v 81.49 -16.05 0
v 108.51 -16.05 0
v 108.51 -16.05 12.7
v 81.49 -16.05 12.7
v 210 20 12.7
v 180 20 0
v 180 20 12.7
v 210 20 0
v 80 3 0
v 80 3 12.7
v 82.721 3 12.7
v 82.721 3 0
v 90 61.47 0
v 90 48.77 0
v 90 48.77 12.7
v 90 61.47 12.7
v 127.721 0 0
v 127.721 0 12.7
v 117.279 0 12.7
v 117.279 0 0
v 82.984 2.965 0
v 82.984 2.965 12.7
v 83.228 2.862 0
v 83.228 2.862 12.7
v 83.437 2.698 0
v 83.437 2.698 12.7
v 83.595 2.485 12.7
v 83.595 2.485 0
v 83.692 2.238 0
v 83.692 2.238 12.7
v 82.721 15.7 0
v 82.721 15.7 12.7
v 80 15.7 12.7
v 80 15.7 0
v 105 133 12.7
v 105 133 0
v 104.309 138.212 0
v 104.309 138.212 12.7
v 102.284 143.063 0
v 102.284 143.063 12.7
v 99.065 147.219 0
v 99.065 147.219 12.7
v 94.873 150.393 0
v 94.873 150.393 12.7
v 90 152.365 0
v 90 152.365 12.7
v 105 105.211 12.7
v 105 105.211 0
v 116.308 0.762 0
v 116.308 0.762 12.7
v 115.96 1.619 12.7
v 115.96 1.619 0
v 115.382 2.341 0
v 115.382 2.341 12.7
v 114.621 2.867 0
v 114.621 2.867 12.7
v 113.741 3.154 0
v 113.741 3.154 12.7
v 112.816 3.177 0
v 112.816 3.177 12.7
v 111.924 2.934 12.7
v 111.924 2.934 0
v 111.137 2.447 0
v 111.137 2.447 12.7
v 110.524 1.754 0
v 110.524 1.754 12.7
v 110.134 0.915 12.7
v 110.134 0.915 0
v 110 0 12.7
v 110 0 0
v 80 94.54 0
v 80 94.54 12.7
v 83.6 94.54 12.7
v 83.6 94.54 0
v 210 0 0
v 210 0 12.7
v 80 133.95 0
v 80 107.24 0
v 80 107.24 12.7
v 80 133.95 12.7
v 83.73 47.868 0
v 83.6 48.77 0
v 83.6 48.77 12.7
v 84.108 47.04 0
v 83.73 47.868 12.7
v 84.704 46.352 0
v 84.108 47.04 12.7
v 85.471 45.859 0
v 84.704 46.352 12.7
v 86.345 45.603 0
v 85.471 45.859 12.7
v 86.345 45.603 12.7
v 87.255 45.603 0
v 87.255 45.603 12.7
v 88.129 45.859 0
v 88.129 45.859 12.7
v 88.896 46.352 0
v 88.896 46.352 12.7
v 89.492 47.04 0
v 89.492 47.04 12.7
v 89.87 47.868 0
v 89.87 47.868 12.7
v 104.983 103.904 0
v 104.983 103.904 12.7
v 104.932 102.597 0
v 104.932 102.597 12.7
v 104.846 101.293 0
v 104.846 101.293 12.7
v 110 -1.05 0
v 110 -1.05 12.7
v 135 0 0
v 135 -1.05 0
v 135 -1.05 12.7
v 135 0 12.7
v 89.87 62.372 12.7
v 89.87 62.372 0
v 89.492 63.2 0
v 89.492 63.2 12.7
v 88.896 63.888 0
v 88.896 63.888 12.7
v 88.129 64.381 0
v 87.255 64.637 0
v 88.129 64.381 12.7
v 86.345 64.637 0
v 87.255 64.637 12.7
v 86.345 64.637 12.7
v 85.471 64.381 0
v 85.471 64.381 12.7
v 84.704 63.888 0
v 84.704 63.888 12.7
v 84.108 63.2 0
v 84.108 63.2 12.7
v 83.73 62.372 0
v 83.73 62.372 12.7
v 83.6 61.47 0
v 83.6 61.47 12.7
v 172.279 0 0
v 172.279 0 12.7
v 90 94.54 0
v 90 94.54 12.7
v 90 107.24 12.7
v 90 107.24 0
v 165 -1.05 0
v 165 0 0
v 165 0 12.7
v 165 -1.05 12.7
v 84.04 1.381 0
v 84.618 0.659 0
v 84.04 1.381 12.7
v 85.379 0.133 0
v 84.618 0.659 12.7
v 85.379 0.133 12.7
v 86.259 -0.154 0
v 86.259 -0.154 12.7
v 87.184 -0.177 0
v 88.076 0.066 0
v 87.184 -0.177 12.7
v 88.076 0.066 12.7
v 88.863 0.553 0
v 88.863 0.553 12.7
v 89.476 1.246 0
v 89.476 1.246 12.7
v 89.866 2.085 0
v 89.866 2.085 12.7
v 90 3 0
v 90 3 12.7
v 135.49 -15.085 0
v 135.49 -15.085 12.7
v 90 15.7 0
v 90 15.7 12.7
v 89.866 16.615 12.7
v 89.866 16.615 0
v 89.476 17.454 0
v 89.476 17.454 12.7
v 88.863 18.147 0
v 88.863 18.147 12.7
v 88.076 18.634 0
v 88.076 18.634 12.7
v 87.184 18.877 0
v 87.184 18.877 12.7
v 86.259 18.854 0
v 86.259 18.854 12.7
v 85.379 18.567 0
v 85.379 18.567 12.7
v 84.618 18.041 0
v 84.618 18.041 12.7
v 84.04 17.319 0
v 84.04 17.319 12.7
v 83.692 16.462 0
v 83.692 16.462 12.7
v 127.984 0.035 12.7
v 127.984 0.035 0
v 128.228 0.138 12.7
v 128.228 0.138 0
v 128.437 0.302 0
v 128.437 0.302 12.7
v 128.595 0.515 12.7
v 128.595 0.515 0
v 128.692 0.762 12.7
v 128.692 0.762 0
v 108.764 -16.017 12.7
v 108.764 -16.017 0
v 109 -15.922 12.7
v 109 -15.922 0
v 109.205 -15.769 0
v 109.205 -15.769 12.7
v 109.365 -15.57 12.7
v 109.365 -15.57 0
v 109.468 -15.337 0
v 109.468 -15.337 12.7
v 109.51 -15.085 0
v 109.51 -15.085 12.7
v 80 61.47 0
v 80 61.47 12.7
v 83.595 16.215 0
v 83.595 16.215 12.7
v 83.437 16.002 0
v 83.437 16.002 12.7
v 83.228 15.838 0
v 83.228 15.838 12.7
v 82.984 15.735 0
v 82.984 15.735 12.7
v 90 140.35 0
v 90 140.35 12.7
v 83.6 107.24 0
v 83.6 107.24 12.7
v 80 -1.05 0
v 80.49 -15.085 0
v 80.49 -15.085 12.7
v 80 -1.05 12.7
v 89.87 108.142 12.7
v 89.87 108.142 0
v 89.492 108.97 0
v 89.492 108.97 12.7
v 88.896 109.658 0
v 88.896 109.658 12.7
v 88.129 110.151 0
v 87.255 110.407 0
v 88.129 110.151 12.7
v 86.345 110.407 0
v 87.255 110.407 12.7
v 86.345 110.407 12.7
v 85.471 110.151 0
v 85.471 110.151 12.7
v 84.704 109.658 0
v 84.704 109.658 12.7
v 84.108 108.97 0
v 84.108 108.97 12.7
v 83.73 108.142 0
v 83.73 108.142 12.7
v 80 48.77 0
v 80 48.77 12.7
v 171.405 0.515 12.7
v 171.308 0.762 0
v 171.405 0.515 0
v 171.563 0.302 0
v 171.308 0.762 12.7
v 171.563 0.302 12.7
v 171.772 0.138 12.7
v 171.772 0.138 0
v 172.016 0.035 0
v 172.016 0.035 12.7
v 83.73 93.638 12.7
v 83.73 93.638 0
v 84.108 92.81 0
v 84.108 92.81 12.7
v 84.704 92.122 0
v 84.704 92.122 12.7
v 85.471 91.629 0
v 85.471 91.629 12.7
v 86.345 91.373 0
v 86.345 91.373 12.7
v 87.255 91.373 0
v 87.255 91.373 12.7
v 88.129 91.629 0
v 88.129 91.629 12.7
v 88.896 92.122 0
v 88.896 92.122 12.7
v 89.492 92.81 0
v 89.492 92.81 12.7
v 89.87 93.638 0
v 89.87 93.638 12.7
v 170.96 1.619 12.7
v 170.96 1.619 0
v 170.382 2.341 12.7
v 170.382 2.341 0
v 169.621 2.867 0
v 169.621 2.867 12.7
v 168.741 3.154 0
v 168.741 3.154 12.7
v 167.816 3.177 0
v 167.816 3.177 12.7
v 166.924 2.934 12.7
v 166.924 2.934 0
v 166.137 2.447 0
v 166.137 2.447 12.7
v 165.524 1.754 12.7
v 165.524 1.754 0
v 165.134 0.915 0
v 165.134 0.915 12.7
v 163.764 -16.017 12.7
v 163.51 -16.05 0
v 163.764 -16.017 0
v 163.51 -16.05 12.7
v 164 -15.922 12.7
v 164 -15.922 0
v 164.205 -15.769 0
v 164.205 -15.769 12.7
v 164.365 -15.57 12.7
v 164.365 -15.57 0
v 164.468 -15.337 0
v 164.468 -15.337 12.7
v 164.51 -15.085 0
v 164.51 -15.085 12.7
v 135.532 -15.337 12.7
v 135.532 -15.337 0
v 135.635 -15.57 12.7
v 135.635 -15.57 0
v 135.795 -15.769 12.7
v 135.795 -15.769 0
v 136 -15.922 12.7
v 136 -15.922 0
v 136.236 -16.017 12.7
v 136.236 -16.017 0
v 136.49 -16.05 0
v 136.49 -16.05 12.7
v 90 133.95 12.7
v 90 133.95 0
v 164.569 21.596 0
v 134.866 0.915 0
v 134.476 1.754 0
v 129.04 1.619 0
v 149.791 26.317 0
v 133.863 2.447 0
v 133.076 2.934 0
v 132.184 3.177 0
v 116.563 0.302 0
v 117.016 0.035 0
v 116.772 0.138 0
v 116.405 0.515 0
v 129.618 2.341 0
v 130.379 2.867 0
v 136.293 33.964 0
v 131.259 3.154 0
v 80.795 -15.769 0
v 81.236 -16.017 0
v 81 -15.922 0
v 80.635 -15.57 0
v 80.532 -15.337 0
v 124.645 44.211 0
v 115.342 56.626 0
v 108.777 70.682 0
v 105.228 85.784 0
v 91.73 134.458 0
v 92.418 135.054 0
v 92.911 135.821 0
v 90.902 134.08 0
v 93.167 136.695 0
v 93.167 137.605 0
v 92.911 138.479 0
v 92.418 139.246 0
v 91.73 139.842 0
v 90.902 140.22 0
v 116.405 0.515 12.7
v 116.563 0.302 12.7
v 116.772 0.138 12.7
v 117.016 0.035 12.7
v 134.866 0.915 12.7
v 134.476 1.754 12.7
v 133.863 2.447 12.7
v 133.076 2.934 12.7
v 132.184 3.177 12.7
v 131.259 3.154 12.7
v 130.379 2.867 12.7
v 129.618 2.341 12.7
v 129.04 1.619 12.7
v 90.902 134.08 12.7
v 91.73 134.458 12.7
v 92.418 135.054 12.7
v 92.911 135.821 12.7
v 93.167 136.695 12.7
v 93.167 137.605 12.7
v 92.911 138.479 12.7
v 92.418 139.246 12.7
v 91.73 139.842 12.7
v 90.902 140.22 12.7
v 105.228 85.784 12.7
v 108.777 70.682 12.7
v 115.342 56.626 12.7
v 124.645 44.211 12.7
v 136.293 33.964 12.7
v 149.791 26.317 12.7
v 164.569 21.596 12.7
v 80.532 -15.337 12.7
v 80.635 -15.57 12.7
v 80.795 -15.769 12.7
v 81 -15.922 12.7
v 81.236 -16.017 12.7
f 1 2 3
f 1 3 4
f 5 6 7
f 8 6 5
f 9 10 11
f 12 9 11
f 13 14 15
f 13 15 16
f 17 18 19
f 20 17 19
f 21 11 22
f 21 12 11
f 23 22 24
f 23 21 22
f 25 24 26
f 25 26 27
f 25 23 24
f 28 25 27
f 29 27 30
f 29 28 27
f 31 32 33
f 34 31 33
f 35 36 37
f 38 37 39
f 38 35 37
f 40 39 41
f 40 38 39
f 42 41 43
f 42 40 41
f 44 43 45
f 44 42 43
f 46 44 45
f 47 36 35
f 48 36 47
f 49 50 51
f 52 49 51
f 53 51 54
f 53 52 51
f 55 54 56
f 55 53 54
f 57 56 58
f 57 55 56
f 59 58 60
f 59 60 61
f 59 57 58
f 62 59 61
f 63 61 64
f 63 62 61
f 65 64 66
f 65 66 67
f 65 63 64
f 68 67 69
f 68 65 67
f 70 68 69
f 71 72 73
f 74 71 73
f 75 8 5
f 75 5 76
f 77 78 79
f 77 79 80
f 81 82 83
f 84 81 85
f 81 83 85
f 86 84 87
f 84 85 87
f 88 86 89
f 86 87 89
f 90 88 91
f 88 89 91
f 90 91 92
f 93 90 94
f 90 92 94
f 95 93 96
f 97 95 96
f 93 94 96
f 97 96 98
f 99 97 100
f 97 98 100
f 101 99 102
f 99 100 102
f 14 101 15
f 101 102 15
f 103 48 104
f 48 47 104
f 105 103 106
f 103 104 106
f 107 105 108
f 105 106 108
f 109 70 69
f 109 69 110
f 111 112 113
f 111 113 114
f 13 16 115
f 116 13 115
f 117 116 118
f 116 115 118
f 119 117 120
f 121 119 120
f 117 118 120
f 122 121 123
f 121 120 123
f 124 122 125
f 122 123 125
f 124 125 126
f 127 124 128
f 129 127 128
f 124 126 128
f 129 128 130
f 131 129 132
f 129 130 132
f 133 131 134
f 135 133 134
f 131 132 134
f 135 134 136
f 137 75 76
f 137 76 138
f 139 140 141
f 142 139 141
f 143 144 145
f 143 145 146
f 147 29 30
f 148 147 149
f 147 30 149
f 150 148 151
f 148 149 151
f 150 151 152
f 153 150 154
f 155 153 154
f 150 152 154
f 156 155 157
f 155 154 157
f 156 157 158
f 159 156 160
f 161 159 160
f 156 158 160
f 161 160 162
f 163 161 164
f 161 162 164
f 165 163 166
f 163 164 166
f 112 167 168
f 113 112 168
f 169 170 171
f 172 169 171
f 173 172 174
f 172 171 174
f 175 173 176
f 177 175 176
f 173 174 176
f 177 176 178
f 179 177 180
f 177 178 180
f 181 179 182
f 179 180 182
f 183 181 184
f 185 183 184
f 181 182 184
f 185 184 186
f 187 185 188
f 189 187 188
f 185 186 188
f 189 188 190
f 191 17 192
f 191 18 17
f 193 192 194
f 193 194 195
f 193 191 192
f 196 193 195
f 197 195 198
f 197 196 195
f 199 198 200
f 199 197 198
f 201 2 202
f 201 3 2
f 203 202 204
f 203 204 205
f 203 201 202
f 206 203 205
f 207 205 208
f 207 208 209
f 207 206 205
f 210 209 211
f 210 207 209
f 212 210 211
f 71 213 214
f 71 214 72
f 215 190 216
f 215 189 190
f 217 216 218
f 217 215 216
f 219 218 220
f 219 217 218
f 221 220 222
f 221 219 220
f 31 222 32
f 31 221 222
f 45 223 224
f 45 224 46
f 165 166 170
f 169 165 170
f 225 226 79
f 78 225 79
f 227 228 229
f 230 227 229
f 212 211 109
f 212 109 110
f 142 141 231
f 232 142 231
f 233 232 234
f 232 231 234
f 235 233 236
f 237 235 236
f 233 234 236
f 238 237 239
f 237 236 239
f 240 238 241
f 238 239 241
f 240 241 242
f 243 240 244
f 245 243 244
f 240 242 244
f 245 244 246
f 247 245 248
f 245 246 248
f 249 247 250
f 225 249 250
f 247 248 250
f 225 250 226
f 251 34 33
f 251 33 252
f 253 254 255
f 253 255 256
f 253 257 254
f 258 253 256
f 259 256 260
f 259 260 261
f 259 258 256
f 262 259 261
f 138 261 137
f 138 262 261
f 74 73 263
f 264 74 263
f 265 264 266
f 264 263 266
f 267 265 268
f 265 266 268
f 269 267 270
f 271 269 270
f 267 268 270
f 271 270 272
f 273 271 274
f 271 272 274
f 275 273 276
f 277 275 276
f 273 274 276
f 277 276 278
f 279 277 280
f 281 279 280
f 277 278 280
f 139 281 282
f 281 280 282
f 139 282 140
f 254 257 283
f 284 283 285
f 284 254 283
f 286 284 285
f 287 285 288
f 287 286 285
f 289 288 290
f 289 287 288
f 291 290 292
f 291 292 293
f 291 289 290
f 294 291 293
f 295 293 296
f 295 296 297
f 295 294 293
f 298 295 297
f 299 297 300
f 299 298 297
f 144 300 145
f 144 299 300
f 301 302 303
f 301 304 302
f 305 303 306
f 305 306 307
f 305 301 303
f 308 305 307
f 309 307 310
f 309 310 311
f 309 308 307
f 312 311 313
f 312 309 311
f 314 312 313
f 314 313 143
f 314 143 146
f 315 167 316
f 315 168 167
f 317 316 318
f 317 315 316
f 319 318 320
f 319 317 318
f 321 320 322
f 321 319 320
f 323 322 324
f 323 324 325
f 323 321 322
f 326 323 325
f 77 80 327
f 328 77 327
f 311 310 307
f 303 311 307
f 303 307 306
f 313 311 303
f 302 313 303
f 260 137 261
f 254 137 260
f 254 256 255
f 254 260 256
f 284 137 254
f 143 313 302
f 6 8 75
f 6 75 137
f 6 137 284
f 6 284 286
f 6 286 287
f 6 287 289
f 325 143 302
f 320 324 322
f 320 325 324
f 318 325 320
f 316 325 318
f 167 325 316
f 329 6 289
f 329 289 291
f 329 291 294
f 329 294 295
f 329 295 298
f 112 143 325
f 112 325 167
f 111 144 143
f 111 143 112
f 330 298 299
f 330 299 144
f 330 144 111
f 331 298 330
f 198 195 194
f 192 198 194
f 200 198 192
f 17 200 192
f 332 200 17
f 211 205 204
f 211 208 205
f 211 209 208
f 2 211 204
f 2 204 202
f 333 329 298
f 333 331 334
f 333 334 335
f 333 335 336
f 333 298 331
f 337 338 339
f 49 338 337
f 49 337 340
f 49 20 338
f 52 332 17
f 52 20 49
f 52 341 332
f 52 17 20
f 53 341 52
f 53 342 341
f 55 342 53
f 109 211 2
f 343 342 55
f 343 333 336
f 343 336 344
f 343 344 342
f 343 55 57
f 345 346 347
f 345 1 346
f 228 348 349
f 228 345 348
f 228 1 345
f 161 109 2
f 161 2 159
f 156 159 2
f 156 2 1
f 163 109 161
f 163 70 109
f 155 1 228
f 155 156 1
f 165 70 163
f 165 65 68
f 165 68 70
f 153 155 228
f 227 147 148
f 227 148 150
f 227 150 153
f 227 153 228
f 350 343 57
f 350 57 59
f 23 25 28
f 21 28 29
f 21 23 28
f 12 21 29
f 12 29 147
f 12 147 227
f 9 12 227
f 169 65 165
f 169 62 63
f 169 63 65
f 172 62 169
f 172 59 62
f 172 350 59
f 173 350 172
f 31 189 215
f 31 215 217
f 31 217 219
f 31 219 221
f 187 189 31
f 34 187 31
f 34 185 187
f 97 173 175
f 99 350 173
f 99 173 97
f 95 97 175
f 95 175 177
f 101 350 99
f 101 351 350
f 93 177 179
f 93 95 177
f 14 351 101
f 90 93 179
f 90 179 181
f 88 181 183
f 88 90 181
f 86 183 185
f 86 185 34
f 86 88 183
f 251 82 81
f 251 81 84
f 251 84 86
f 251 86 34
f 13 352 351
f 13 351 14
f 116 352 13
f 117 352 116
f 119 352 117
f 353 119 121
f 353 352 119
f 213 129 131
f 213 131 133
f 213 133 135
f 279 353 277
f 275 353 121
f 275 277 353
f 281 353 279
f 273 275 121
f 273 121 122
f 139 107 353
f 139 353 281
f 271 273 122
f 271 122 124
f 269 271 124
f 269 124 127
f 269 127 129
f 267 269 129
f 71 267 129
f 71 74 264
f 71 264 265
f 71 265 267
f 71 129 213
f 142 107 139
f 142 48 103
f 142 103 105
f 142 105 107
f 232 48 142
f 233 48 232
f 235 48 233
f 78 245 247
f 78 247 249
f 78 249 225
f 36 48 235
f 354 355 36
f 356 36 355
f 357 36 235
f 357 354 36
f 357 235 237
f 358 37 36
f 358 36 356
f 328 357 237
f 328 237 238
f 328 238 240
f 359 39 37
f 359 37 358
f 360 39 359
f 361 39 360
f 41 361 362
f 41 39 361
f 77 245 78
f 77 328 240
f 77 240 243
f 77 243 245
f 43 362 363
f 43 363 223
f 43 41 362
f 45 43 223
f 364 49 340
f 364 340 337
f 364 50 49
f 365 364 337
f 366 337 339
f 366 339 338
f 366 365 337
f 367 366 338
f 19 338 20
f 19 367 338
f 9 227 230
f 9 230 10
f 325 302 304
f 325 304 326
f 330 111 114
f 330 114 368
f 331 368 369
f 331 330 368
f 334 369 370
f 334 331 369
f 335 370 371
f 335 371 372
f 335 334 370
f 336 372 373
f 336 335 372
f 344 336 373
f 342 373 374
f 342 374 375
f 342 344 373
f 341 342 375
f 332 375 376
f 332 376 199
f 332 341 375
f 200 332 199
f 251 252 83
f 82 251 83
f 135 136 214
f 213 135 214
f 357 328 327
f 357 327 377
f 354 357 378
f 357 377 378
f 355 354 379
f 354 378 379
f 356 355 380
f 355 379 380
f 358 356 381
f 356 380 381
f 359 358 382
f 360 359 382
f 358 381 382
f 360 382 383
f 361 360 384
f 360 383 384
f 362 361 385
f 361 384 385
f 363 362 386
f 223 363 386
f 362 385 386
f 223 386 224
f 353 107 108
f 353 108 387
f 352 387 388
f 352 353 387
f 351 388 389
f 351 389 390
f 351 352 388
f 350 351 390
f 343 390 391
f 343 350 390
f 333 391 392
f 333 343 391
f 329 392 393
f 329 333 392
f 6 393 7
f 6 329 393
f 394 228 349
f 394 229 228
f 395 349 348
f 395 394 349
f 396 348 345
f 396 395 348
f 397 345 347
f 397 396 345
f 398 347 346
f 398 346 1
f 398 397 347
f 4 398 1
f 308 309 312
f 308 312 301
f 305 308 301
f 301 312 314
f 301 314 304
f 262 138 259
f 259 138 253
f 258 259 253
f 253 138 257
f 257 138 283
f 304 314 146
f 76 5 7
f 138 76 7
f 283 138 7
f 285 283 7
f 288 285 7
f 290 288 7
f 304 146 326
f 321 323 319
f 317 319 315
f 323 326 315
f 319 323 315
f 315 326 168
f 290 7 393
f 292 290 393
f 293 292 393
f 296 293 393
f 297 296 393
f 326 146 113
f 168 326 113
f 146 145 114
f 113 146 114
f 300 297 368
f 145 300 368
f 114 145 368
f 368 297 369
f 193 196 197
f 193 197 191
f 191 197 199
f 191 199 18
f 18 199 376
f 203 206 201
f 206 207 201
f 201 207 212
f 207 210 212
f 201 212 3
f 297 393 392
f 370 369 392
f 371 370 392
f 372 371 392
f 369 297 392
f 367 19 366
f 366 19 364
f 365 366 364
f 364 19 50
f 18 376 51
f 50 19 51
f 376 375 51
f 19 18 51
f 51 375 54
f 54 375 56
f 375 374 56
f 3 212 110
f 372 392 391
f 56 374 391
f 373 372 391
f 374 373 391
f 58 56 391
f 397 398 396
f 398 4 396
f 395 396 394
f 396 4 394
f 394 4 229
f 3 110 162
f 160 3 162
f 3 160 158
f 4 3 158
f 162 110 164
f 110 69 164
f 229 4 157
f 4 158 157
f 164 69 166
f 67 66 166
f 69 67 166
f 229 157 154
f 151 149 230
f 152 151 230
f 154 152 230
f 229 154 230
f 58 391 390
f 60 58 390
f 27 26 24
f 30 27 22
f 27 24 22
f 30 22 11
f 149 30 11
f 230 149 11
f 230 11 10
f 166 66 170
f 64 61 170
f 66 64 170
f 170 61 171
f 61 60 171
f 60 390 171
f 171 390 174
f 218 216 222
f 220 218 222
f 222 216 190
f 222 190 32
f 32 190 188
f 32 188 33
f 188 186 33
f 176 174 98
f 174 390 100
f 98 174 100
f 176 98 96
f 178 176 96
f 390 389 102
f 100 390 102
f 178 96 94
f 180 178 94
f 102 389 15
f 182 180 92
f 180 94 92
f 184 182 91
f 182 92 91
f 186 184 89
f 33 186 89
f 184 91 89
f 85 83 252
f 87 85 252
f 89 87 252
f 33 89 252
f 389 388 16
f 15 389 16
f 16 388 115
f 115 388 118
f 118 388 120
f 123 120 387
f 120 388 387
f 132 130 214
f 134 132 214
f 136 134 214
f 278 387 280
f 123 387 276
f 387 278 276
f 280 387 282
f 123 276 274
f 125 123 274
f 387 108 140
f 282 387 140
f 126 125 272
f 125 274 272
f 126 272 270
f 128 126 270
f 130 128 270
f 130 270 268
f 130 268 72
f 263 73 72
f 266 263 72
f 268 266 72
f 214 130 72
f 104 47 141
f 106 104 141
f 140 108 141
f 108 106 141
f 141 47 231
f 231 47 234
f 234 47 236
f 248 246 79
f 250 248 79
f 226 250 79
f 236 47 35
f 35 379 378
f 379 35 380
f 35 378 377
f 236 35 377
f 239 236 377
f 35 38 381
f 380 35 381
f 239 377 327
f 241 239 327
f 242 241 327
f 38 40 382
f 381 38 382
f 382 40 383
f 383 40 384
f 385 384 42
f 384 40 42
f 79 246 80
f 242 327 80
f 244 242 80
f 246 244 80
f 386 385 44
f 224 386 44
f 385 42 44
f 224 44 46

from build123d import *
from OCP.BRepFilletAPI import BRepFilletAPI_MakeChamfer

# Parameters (mm, degrees)
BOSS_EXTRUDE1_DEPTH = 12.7
FILLET1_R           = 50
FILLET2_R           = 20
CUT_EXTRUDE1_DEPTH  = 261.135137957
CHAMFER1_SIZE       = 15
CHAMFER1_SIZE2      = 0.523811542
FILLET3_R           = 1
LPATTERN1_COUNT     = 3
LPATTERN1_PITCH     = 45.77
CUT_EXTRUDE2_DEPTH  = 261.135137957


with BuildPart() as part:
    # Sketch1 → Boss-Extrude1 (new body)
    with BuildSketch(Plane.XY):
        with BuildLine():
            Line((105, 153), (105, 103))
            ThreePointArc((105, 103), (124.067004371, 44.843678649), (180, 20))
            Line((180, 20), (210, 20))
            Line((210, 20), (210, 0))
            Line((210, 0), (171.4, 0))
            ThreePointArc((171.4, 0), (168.2, 3.2), (165, 0))
            Line((165, 0), (165, -16.05))
            Line((165, -16.05), (135, -16.05))
            Line((135, -16.05), (135, 0))
            ThreePointArc((135, 0), (131.8, 3.2), (128.6, 0))
            Line((128.6, 0), (116.4, 0))
            ThreePointArc((116.4, 0), (113.2, 3.2), (110, 0))
            Line((110, 0), (110, -16.05))
            Line((110, -16.05), (80, -16.05))
            Line((80, -16.05), (80, 0))
            Line((80, 0), (80, 153))
            Line((80, 153), (105, 153))
        make_face()
    extrude(amount=BOSS_EXTRUDE1_DEPTH)

    # Fillet1
    fillet1_edges = [part.edges().sort_by_distance(p)[0] for p in [
        (105, 103, 6.35),
    ]]
    fillet(fillet1_edges, radius=FILLET1_R)

    # Fillet2
    fillet2_edges = [part.edges().sort_by_distance(p)[0] for p in [
        (105, 153, 6.35),
    ]]
    fillet(fillet2_edges, radius=FILLET2_R)

    # Sketch2 → Cut-Extrude1 (cut, through all)
    with BuildSketch(Plane.XY.offset(12.7)):
        with BuildLine():
            Line((83.6, 15.7), (80, 15.7))
            Line((80, 15.7), (80, 3))
            Line((80, 3), (83.6, 3))
            ThreePointArc((83.6, 3), (86.8, -0.2), (90, 3))
            Line((90, 3), (90, 15.7))
            ThreePointArc((90, 15.7), (86.8, 18.9), (83.6, 15.7))
        make_face()
    cut_extrude1 = extrude(amount=-CUT_EXTRUDE1_DEPTH, mode=Mode.SUBTRACT)

    # Chamfer1: one chamfer whose edges measure the first distance from different faces: ONE call of the kernel's chamfer builder (chamfer() names one face for all edges)
    chamfer1_edges_1 = [part.edges().sort_by_distance(p)[0] for p in [
        (165, -16.05, 6.35),
    ]]
    chamfer1_side_1 = [part.faces().sort_by_distance(p)[0] for p in [
        (165, -8.025, 6.35),
    ]]
    chamfer1_edges_2 = [part.edges().sort_by_distance(p)[0] for p in [
        (135, -16.05, 6.35),
    ]]
    chamfer1_side_2 = [part.faces().sort_by_distance(p)[0] for p in [
        (135, -8.025, 6.35),
    ]]
    chamfer1_edges_3 = [part.edges().sort_by_distance(p)[0] for p in [
        (110, -16.05, 6.35),
    ]]
    chamfer1_side_3 = [part.faces().sort_by_distance(p)[0] for p in [
        (110, -8.025, 6.35),
    ]]
    chamfer1_edges_4 = [part.edges().sort_by_distance(p)[0] for p in [
        (80, -16.05, 6.35),
    ]]
    chamfer1_side_4 = [part.faces().sort_by_distance(p)[0] for p in [
        (80, -6.525, 6.35),
    ]]
    chamfer1 = BRepFilletAPI_MakeChamfer(part.part.solid().wrapped)
    for e in chamfer1_edges_1:
        chamfer1.Add(CHAMFER1_SIZE, CHAMFER1_SIZE2, e.wrapped, chamfer1_side_1[0].wrapped)  # the first distance lies on this face
    for e in chamfer1_edges_2:
        chamfer1.Add(CHAMFER1_SIZE, CHAMFER1_SIZE2, e.wrapped, chamfer1_side_2[0].wrapped)  # the first distance lies on this face
    for e in chamfer1_edges_3:
        chamfer1.Add(CHAMFER1_SIZE, CHAMFER1_SIZE2, e.wrapped, chamfer1_side_3[0].wrapped)  # the first distance lies on this face
    for e in chamfer1_edges_4:
        chamfer1.Add(CHAMFER1_SIZE, CHAMFER1_SIZE2, e.wrapped, chamfer1_side_4[0].wrapped)  # the first distance lies on this face
    add(Compound.cast(chamfer1.Shape()), mode=Mode.REPLACE)

    # Fillet3
    fillet3_edges = [part.edges().sort_by_distance(p)[0] for p in [
        (171.4, 0, 6.35),
        (128.6, 0, 6.35),
        (116.4, 0, 6.35),
        (83.6, 3, 6.35),
        (83.6, 15.7, 6.35),
        (109.476188458, -16.05, 6.35),
        (80.523811542, -16.05, 6.35),
        (135.523811542, -16.05, 6.35),
        (164.476188458, -16.05, 6.35),
    ]]
    fillet(fillet3_edges, radius=FILLET3_R)

    # LPattern1: Cut-Extrude1 ×3
    with Locations(*[(0, i * LPATTERN1_PITCH, 0) for i in range(1, LPATTERN1_COUNT)]):
        add(cut_extrude1, mode=Mode.SUBTRACT)

    # Sketch3 → Cut-Extrude2 (cut, through all)
    with BuildSketch(Plane.XY.offset(12.7)):
        with BuildLine():
            Line((80, 133.95), (90, 133.95))
            ThreePointArc((90, 133.95), (93.2, 137.15), (90, 140.35))
            Line((90, 140.35), (90, 153))
            Line((90, 153), (80, 153))
            Line((80, 153), (80, 133.95))
        make_face()
    extrude(amount=-CUT_EXTRUDE2_DEPTH, mode=Mode.SUBTRACT)


solid = part.part
